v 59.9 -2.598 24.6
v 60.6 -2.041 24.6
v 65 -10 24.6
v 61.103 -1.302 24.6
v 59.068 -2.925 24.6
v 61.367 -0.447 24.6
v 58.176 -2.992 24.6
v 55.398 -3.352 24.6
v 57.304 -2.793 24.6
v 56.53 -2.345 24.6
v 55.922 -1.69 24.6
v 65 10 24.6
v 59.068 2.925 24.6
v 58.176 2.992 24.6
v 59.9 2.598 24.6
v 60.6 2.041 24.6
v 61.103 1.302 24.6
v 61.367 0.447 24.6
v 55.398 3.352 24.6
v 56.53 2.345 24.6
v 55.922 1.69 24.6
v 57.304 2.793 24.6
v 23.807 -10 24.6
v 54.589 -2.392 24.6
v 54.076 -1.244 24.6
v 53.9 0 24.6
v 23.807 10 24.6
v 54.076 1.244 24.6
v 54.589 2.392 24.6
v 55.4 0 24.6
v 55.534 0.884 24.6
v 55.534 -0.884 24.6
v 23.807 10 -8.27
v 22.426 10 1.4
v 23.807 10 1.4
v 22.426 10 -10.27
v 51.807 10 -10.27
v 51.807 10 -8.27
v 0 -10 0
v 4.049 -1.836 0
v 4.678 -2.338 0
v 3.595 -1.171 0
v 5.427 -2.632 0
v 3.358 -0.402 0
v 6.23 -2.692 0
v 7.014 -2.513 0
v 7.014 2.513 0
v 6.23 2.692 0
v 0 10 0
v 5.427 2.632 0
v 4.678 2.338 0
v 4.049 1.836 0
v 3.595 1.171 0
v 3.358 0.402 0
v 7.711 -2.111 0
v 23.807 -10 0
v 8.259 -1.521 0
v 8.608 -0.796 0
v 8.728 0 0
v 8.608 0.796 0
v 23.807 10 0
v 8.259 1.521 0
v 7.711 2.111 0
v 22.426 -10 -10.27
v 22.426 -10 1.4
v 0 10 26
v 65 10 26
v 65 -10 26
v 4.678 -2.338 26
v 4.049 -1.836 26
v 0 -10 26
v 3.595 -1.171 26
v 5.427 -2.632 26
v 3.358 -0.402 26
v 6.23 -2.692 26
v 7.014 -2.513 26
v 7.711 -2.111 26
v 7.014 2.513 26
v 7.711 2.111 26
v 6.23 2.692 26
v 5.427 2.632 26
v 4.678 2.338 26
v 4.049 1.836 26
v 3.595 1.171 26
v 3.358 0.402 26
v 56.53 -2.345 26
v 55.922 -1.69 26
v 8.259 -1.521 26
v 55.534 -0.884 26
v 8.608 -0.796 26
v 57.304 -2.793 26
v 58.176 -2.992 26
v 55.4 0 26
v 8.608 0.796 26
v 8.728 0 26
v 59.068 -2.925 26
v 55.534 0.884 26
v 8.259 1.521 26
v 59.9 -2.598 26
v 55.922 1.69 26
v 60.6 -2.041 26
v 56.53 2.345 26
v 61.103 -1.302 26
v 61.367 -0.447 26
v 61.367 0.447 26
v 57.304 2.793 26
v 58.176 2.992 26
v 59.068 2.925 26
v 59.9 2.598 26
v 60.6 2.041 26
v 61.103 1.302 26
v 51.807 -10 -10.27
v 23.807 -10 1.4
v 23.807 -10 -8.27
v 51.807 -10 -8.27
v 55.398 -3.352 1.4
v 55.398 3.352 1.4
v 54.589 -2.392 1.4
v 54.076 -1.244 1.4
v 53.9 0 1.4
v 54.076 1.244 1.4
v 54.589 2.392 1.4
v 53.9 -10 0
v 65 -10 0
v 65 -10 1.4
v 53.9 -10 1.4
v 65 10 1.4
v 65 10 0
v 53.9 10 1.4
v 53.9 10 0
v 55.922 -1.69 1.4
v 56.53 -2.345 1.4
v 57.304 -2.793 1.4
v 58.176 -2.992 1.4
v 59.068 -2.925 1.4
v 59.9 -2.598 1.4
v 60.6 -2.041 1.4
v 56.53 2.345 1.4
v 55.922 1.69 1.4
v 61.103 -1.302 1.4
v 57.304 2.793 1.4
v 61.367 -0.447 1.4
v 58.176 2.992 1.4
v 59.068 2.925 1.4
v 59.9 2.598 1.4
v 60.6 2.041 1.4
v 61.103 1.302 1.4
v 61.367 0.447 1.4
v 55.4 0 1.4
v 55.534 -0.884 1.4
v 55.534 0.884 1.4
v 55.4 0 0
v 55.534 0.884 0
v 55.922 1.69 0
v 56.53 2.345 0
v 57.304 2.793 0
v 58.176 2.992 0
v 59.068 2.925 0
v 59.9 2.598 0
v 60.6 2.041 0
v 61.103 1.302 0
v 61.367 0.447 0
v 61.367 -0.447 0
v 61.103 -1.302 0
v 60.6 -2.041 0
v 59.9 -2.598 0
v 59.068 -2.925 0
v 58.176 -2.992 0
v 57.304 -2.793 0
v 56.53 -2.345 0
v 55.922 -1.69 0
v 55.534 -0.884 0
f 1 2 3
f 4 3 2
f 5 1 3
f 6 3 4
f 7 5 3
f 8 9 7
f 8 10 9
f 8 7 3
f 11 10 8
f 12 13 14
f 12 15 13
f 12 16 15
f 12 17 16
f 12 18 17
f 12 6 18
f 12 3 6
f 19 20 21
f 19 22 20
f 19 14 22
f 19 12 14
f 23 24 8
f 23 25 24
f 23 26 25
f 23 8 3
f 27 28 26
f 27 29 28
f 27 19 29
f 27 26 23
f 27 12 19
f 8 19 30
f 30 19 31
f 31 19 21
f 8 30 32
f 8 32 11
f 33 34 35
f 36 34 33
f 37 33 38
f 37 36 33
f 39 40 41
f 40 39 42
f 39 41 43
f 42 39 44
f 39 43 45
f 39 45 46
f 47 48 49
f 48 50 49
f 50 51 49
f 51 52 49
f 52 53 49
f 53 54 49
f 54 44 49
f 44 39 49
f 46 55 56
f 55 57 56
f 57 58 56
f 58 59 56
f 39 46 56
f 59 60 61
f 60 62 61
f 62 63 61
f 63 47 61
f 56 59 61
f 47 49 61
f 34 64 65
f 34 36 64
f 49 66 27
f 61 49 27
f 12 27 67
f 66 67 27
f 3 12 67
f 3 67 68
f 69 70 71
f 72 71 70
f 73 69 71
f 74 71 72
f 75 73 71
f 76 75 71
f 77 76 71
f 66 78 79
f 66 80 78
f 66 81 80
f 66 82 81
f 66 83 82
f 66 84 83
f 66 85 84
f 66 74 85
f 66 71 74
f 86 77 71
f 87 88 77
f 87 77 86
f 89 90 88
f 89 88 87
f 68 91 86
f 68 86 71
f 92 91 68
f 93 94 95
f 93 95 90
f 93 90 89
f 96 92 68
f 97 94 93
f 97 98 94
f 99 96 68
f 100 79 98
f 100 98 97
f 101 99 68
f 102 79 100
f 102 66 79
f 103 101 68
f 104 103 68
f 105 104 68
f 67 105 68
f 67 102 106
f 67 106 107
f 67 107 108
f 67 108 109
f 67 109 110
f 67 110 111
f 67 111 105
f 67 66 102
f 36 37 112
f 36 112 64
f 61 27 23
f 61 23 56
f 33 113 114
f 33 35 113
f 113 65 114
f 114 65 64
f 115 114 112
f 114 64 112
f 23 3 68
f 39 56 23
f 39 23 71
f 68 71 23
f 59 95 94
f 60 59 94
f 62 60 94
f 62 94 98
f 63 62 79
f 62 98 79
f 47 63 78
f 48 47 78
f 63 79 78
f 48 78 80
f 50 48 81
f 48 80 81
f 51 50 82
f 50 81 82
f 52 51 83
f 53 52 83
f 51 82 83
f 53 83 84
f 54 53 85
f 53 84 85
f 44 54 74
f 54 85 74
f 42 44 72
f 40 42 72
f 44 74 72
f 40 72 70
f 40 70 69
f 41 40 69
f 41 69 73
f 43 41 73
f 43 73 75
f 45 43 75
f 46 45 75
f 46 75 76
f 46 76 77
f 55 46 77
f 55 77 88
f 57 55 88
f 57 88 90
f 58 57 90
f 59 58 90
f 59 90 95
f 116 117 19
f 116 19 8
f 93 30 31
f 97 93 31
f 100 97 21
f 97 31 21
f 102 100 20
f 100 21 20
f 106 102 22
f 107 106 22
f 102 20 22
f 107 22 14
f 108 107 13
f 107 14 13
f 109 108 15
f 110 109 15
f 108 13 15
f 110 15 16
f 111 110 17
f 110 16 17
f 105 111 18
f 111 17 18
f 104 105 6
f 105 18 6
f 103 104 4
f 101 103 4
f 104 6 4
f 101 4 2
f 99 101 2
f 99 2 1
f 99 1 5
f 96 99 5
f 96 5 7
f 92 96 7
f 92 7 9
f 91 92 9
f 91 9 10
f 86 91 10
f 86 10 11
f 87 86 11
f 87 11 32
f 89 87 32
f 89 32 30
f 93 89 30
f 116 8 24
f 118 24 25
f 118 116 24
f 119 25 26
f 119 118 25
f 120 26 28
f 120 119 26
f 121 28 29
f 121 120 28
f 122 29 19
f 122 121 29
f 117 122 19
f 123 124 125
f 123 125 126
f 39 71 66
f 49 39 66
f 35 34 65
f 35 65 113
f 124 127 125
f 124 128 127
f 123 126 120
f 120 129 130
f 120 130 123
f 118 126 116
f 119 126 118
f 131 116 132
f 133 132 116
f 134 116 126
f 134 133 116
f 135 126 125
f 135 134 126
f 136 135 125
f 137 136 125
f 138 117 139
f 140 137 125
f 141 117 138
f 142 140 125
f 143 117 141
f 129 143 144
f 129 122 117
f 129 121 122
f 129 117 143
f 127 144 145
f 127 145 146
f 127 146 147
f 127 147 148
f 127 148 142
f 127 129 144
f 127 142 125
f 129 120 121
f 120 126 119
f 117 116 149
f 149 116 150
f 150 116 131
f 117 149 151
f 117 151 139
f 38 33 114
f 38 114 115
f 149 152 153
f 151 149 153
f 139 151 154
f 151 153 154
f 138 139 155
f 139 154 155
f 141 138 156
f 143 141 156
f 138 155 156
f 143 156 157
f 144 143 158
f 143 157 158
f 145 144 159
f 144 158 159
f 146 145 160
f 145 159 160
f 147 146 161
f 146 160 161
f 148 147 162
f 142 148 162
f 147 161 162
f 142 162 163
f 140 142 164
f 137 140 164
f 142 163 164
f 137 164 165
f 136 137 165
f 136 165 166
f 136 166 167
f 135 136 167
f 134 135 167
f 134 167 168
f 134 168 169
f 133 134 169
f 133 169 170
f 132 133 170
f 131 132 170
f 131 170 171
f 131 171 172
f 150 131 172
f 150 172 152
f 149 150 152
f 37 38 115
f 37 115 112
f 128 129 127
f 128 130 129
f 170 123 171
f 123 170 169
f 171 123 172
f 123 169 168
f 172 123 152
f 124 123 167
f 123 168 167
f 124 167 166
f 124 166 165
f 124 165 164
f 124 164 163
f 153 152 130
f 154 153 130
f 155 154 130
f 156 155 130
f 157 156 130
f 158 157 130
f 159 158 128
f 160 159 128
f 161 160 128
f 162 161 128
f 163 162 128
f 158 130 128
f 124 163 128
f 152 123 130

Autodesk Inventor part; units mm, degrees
ref_plane "YZ Plane" through (0, 0, 0) normal (1, 0, 0) x (0, 1, 0)
ref_plane "XZ Plane" through (0, 0, 0) normal (0, 1, 0) x (-1, 0, 0)
ref_plane "XY Plane" through (0, 0, 0) normal (0, 0, 1) x (1, 0, 0)
sketch "Sketch1" plane through (0, 0, 0) normal (0, 0, 1) x (1, 0, 0)
  line L0 (0, 0) -> (65, 0)
  line L1 (0, 0) -> (0, 10)
  line L2 (0, 10) -> (65, 10)
  line L3 (65, 10) -> (65, -10)
  line L4 (65, -10) -> (0, -10)
  line L5 (0, -10) -> (0, 0)
  dimension "d0" = 65
  dimension "d1" = 10
  dimension "d2" = 65
  dimension "d3" = 20
extrude "Extrusion1" add sketch "Sketch1" along normal blind 26
sketch "Sketch2" plane through (0, 0, 26) normal (0, 0, 1) x (1, 0, 0)
  circle A0 centre (6.028, 0) radius 2.7
  circle A1 centre (58.4004, 0) radius 2.7
  point P0 (0, 0)
  dimension "d6" = 5.4
  dimension "d7" = 5.4
extrude "Extrusion2" cut sketch "Sketch2" against normal blind 26
sketch "Sketch3" plane through (0, 10, 0) normal (0, 1, 0) x (1, 0, 0)
  line L0 (65, 0) -> (65, -26) projected
  line L1 (65, -13) -> (65, -1.4)
  line L2 (65, -1.4) -> (65, -24.6)
  line L3 (65, -24.6) -> (23.8068, -24.6)
  line L4 (23.8068, -24.6) -> (23.8068, -1.4)
  line L5 (23.8068, -1.4) -> (65, -1.4)
  point P0 (0, 0)
  dimension "d10" = 11.6
  dimension "d11" = 23.2
extrude "Extrusion3" cut sketch "Sketch3" against normal blind 20
sketch "Sketch4" plane through (0, -10, 0) normal (0, -1, 0) x (1, 0, 0)
  point P0 (0, 0)
sketch "Sketch8" plane through (65, 10, 24.6) normal (0, 0, -1) x (-1, 0, 0)
  circle A0 centre (6.5996, -10) radius 2.7 projected
  circle A1 centre (6.5996, -10) radius 3
  circle A2 centre (6.5996, -10) radius 3
  point P0 (65, -10)
  dimension "d22" = 6
  dimension "d23" = 6
extrude "Extrusion7" cut sketch "Sketch8" along normal mid plane 60 contours A0 | A1
sketch "Sketch9" plane through (0, 10, 0) normal (0, 1, 0) x (1, 0, 0)
  line L0 (65, -1.4) -> (23.8068, -1.4) projected
  line L1 (23.8068, -1.4) -> (23.8068, 8.27)
  line L2 (23.8068, 8.27) -> (51.8068, 8.27)
  line L3 (51.8068, 8.27) -> (51.8068, 10.27)
  line L4 (51.8068, 10.27) -> (22.4262, 10.27)
  line L5 (22.4262, 10.27) -> (22.4262, -1.4)
  line L6 (22.4262, -1.4) -> (23.8068, -1.4)
  point P0 (0, 0)
  dimension "d26" = 9.67
  dimension "d27" = 28
  dimension "d28" = 2
extrude "Extrusion8" add sketch "Sketch9" against normal blind 20 separate body
sketch "Sketch10" plane through (23.8068, 10, 1.4) normal (0, 0, 1) x (1, 0, 0)
  circle A0 centre (34.5936, -10) radius 3 projected
  circle A1 centre (34.5936, -10) radius 4.5
  circle A2 centre (34.5936, -10) radius 3 projected
  circle A3 centre (34.5936, -10) radius 3
  line L0 (31.5917, -6.6476) -> (31.5917, -13.3524)
  line L1 (28, 0) -> (28, -20) projected
  point P0 (-23.8068, -10)
  dimension "d31" = 9
extrude "Extrusion9" add sketch "Sketch10" along normal blind 23.75 contours L0 A1 picked at (31.1031, -9.8203) bodies 1
sketch "Sketch11" plane through (0, 10, 0) normal (0, 1, 0) x (1, 0, 0)
  line L0 (65, -1.4) -> (23.8068, -1.4) projected
  line L1 (23.8068, -1.4) -> (53.9004, -1.4)
  line L2 (53.9004, -1.4) -> (53.9004, 0)
  line L3 (53.9004, 0) -> (23.8068, 0)
  line L4 (23.8068, 0) -> (23.8068, -1.4)
  point P0 (0, 0)
extrude "Extrusion10" cut sketch "Sketch11" against normal blind 23.75 bodies 1
properties part number "finge"
